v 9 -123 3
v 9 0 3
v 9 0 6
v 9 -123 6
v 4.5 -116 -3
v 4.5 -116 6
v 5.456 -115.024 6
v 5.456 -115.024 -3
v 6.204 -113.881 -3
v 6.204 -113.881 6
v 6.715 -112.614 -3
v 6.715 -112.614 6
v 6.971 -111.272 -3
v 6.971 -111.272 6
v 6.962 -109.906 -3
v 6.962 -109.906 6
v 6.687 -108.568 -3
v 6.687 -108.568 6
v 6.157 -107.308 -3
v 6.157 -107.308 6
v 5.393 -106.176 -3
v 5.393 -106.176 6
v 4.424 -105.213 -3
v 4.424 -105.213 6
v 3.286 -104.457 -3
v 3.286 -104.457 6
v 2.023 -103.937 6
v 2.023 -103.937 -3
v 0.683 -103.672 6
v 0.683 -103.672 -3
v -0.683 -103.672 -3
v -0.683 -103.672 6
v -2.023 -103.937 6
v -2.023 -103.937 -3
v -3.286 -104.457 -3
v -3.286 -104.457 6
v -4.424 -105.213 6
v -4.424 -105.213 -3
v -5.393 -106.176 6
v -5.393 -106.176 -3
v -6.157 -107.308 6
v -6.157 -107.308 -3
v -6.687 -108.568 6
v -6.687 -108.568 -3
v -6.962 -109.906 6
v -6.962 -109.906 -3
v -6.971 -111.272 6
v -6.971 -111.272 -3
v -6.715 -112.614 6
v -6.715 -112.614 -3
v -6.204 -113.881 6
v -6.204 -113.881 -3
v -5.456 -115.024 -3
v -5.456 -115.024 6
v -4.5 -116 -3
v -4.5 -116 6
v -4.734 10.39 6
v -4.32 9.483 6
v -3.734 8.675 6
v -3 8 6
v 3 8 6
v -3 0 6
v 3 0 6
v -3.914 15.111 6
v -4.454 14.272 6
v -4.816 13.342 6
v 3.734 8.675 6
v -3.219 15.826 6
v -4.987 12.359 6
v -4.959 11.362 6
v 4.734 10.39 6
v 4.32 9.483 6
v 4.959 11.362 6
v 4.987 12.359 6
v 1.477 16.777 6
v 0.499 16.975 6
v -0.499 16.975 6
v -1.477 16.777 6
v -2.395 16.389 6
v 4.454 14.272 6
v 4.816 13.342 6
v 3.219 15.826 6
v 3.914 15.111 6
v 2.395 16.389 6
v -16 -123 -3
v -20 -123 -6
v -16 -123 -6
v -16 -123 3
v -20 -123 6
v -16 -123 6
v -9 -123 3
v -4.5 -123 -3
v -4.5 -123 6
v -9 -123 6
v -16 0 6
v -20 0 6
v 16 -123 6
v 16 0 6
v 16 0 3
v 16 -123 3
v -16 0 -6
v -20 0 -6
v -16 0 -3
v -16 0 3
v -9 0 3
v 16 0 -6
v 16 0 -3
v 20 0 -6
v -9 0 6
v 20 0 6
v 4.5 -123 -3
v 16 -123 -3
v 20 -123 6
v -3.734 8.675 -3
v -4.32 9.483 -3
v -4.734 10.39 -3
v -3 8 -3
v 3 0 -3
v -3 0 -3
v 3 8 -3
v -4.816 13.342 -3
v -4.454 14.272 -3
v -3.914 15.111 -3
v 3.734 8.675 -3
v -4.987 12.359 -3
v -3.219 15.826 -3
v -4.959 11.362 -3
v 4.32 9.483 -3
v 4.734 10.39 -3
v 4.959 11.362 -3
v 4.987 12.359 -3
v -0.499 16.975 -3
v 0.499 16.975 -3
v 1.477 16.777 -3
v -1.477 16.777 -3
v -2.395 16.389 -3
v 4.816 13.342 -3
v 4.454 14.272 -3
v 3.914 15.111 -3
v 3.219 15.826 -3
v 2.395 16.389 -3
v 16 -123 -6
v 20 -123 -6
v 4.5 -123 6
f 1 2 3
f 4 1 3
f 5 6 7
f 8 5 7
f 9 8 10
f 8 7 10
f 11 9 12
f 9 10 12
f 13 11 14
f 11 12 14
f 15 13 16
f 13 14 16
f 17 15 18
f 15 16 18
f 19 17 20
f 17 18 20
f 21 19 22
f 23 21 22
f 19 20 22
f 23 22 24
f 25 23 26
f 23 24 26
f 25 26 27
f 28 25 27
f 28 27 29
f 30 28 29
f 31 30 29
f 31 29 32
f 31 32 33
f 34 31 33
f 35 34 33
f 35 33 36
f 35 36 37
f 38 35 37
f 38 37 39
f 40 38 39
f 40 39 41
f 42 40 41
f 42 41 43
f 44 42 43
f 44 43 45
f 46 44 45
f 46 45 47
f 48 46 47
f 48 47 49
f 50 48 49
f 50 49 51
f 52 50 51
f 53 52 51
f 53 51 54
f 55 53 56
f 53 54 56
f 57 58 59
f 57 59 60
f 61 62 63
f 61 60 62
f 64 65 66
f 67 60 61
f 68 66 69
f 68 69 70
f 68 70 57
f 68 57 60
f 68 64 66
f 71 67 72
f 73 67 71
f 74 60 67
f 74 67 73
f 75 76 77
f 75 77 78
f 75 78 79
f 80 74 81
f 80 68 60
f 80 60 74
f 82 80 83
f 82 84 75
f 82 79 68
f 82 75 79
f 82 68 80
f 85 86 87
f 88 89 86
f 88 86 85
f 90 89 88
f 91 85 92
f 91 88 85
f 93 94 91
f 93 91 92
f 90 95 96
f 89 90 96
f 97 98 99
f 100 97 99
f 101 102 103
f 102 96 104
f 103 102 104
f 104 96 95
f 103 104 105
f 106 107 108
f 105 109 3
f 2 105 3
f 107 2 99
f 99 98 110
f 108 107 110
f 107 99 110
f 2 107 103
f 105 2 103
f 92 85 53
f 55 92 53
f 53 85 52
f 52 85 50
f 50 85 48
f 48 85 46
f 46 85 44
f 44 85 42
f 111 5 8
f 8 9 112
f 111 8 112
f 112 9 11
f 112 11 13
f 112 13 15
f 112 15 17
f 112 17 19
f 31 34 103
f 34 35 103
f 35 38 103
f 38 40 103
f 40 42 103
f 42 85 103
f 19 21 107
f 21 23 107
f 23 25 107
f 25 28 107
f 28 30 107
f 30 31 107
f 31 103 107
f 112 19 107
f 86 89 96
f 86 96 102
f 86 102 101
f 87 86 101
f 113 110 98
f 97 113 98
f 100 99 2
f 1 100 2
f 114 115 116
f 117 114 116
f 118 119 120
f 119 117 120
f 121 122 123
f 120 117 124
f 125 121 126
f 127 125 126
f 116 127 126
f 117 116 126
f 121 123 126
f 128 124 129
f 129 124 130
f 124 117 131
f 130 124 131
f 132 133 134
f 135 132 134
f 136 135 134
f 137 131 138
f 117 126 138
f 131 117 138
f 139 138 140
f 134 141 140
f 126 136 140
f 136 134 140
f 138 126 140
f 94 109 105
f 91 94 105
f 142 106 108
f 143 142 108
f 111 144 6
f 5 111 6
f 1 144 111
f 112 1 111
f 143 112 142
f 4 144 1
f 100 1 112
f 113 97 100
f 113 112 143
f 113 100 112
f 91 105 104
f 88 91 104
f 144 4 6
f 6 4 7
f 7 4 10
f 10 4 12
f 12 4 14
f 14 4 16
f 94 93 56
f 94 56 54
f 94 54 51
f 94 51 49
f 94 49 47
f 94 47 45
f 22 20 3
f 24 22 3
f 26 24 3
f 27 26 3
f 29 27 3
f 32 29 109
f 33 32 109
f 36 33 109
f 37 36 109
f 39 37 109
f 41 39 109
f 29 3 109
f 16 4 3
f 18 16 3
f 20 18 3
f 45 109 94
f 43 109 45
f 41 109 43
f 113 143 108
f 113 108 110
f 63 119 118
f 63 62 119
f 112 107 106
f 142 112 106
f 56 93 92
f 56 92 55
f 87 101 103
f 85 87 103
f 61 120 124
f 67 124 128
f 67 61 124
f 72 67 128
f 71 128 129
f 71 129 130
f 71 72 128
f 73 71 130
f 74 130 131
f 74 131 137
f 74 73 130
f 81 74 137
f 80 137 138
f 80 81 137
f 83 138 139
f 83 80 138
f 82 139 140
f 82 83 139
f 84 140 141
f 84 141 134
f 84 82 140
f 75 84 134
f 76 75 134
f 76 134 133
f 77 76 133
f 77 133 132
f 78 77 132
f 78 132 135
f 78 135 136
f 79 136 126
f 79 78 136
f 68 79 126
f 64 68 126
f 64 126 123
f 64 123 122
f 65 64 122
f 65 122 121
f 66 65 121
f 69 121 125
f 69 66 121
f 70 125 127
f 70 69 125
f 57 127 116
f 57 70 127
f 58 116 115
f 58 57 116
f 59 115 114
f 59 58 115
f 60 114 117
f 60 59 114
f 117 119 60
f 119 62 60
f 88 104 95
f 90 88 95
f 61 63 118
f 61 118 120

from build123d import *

# Parameters (mm, degrees)
PAD_DEPTH         = 123
POCKET_DEPTH      = 12.001
PAD001_DEPTH      = 6
PAD001_DEPTH_BACK = 3


with BuildPart() as body:
    # Sketch → Pad (new body)
    with BuildSketch(Plane.XZ):
        Polygon((-20, 6), (-20, -6), (-16, -6), (-16, -3), (-9, -3), (9, -3), (16, -3), (16, -6), (20, -6), (20, 6), (16, 6), (16, 3), (9, 3), (9, 6), (-9, 6), (-9, 3), (-16, 3), (-16, 6), align=None)
    extrude(amount=PAD_DEPTH)

    # Sketch002 (on Face14 of Pad) → Pocket (cut, through all)
    with BuildSketch(Plane(origin=(0, 0, 6), x_dir=(-1, 0, 0), z_dir=(0, 0, 1))):
        with BuildLine():
            Line((-4.5, 123), (4.5, 123))
            Line((4.5, 123), (4.5, 116))
            ThreePointArc((-4.5, 116), (0, 103.638097), (4.5, 116))
            Line((-4.5, 123), (-4.5, 116))
        make_face()
    extrude(amount=-POCKET_DEPTH, mode=Mode.SUBTRACT)


with BuildPart() as body001:
    # Sketch001 → Pad001 (new body, two sides)
    with BuildSketch(Plane.XY) as pad001_sk:
        with BuildLine():
            Line((-3, 0), (3, 0))
            Line((3, 0), (3, 8))
            ThreePointArc((3, 8), (0, 17), (-3, 8))
            Line((-3, 0), (-3, 8))
        make_face()
    extrude(amount=PAD001_DEPTH)
    extrude(pad001_sk.sketch, amount=-PAD001_DEPTH_BACK)


solid = Compound([body.part, body001.part])
